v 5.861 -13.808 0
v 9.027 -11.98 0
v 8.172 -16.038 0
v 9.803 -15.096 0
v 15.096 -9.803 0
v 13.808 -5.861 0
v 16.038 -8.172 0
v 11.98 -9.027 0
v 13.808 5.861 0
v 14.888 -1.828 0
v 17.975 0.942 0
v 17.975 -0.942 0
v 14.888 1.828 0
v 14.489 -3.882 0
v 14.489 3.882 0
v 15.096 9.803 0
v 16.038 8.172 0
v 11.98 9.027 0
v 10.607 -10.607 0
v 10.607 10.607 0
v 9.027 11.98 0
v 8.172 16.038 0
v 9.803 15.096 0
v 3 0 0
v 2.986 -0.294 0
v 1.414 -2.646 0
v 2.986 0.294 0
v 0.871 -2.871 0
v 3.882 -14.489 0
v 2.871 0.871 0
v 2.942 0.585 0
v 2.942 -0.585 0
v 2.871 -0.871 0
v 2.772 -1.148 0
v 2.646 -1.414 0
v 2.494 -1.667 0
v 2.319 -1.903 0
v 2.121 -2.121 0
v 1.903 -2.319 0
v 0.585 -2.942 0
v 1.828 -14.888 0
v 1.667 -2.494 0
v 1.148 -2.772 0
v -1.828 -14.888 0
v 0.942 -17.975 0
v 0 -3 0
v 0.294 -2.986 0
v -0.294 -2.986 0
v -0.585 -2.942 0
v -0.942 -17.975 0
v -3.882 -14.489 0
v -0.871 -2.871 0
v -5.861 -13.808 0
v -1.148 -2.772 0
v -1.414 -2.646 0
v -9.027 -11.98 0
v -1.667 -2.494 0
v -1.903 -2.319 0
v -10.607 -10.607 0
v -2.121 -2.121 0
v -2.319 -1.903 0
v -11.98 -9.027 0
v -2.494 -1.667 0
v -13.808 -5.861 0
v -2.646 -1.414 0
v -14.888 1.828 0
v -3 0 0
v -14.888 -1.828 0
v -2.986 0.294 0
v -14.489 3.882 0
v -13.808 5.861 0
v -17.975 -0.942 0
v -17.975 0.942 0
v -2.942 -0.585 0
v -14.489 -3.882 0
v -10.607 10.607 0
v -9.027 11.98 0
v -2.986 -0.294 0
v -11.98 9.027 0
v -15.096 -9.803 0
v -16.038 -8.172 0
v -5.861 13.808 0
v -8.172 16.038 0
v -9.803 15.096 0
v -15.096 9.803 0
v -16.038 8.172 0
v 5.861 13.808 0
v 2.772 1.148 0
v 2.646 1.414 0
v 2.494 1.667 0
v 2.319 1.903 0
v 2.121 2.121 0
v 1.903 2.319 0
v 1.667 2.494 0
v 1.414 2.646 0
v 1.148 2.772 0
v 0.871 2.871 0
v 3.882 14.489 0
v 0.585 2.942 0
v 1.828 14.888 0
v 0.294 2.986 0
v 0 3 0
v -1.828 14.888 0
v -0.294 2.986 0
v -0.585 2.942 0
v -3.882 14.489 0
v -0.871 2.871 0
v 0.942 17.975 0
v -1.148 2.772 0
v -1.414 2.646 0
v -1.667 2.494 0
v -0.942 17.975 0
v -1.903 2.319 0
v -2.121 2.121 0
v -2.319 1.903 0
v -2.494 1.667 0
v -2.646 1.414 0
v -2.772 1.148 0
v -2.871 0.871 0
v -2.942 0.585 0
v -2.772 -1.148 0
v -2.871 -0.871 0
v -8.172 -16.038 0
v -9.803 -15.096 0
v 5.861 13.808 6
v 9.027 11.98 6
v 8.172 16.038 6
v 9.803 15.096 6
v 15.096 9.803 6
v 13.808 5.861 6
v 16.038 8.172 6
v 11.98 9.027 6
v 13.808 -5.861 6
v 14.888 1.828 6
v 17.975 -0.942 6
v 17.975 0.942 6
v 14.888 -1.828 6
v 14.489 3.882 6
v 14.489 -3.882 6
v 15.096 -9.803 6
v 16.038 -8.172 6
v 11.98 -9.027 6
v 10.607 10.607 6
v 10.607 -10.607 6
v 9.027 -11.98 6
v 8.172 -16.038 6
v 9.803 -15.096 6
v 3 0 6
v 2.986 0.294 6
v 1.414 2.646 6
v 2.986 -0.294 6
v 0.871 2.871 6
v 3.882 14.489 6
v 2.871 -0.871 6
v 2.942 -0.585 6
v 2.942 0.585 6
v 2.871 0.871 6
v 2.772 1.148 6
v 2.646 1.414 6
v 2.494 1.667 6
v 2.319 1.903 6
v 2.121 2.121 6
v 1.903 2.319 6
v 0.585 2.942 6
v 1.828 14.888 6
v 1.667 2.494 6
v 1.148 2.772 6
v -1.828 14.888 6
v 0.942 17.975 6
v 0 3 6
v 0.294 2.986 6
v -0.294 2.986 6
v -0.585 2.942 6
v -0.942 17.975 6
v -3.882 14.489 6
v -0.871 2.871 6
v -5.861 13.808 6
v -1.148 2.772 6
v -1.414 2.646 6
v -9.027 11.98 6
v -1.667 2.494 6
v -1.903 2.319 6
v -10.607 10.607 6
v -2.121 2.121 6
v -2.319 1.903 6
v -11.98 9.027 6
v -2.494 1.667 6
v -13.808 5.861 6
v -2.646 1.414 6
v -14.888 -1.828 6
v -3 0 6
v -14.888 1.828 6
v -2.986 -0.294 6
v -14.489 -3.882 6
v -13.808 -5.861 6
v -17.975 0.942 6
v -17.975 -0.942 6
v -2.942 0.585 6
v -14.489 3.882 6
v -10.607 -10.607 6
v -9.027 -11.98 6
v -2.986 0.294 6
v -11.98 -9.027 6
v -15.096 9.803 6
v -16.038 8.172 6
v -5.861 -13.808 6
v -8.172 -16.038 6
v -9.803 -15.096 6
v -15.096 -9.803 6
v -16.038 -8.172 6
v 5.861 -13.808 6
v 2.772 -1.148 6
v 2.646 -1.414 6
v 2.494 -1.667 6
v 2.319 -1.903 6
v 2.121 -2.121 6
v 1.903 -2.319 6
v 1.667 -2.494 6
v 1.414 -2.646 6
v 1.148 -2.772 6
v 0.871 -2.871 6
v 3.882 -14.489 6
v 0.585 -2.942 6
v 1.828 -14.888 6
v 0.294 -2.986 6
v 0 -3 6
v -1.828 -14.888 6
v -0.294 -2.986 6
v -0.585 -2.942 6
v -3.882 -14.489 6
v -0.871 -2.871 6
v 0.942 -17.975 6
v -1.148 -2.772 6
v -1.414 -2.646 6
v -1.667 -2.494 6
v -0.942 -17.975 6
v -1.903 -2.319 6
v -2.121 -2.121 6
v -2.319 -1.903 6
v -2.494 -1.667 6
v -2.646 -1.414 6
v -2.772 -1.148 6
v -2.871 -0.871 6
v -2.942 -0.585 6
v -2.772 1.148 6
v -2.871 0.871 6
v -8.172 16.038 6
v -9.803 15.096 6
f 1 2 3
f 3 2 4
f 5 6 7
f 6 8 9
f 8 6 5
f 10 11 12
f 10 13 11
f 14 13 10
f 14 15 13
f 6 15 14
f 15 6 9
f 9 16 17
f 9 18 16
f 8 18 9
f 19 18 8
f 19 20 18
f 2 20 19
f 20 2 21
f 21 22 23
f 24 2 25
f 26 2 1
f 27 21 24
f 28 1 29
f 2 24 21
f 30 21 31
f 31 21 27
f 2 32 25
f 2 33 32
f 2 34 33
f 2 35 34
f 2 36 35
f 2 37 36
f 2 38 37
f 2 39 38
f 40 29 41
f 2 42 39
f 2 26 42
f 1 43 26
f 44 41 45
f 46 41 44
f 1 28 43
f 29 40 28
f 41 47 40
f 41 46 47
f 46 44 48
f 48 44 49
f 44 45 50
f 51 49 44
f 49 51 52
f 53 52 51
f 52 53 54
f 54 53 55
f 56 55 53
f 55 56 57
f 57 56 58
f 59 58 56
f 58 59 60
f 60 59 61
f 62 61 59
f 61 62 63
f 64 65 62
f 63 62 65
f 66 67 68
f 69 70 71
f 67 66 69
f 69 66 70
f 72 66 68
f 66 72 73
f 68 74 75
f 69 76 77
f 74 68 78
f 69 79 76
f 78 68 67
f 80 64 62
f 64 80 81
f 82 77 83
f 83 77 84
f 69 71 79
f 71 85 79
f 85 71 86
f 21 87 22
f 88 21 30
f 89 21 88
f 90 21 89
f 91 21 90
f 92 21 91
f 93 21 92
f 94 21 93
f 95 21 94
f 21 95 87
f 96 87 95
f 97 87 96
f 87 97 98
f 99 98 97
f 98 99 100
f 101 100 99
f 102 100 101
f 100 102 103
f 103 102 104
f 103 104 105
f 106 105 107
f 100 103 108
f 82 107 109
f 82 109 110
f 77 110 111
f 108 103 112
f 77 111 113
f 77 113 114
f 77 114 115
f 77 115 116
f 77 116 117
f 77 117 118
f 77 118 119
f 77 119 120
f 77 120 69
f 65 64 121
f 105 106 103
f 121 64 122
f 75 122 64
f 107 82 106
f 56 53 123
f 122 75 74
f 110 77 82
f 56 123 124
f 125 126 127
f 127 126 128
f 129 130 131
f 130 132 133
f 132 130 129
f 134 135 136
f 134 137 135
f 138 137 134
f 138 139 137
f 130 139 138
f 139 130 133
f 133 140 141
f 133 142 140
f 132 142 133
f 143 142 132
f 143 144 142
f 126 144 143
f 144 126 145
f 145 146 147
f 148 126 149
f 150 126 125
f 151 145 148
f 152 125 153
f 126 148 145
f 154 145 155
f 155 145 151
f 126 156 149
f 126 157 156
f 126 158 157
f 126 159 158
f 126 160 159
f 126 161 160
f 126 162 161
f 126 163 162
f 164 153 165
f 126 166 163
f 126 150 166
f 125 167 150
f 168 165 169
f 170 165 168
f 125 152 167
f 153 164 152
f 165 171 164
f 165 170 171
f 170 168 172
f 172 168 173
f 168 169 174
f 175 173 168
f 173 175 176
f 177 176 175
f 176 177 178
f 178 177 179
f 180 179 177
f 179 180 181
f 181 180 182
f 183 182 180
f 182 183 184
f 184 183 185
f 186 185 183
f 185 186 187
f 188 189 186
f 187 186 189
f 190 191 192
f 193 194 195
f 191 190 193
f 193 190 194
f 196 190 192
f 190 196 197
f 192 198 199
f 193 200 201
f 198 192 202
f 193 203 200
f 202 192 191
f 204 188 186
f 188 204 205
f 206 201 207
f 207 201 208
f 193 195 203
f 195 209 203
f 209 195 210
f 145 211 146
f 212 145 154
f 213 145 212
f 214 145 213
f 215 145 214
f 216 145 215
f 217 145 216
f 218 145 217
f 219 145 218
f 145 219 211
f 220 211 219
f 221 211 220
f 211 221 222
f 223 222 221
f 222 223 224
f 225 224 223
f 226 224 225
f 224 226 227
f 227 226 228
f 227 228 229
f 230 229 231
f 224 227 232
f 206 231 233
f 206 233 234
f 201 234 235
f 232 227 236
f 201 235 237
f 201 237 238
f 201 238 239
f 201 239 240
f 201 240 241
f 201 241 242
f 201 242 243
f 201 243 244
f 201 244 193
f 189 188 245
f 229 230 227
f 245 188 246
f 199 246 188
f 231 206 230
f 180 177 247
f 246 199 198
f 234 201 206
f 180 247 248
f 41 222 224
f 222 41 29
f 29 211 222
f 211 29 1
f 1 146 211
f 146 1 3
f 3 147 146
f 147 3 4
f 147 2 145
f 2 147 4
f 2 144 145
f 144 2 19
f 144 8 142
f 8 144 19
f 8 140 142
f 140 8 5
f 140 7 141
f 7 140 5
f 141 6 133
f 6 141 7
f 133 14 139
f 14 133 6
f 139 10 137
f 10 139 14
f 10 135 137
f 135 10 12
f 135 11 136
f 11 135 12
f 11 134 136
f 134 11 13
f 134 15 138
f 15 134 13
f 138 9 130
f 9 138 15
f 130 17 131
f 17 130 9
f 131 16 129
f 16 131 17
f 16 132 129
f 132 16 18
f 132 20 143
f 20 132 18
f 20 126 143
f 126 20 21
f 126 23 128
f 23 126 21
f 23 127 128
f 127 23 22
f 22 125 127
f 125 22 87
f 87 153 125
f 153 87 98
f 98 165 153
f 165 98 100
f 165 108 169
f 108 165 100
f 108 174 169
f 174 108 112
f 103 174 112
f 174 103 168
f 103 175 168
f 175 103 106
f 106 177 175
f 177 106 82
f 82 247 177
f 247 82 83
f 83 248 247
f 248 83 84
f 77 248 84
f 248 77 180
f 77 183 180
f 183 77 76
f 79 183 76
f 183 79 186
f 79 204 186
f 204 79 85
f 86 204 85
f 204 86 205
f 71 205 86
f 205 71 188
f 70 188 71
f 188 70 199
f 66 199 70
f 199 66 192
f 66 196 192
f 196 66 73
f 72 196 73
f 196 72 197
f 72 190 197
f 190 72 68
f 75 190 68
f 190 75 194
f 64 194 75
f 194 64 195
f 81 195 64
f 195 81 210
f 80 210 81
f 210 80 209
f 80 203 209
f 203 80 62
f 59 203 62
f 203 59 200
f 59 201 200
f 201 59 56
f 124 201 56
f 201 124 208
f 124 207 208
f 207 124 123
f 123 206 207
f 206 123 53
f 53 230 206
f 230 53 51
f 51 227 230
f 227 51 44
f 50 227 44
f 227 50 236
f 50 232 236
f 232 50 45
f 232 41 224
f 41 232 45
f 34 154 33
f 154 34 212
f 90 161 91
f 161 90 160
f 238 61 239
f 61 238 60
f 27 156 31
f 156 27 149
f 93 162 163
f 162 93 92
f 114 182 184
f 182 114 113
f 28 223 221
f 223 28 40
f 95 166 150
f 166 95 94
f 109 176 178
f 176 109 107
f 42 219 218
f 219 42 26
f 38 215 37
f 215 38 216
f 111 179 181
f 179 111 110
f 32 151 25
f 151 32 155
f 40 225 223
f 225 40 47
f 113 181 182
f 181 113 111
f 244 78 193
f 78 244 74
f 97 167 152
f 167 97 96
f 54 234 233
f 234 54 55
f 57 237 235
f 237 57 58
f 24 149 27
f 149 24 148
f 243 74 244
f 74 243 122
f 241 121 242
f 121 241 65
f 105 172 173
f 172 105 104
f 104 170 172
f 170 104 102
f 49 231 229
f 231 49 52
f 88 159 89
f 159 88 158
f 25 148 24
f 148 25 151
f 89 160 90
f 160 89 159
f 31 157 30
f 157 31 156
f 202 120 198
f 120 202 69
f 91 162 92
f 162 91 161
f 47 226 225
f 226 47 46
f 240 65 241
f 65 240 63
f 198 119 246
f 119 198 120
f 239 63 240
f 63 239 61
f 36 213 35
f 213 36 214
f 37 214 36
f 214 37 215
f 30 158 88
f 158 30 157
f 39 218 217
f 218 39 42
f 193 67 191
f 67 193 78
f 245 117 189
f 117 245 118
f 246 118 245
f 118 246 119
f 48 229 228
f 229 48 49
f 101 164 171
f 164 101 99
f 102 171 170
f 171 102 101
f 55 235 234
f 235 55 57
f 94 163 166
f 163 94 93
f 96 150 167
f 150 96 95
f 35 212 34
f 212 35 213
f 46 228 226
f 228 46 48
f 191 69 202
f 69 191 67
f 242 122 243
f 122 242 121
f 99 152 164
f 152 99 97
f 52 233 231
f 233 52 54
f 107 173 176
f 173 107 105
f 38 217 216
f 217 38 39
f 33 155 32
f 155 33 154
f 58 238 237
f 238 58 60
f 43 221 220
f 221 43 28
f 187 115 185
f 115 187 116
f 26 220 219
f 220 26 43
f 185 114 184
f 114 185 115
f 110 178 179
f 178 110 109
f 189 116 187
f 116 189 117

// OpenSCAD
// Gear-like disc: a polygon profile extruded, with a central bore.
// The tooth pattern is phased so one tooth tip is centred on the +X axis.
teeth = 12;
root_r = 15;
tip_r = 18;
thickness = 6;
bore_d = 6;

function pt(r, a) = [r * cos(a), r * sin(a)];

module gear_profile() {
    step = 360 / teeth;
    polygon([
        for (i = [0 : teeth - 1])
            let (a = i * step - 15)
                each [
                    pt(root_r, a),
                    pt(root_r, a + 8),
                    pt(tip_r, a + 12),
                    pt(tip_r, a + 18),
                    pt(root_r, a + 22)
                ]
    ]);
}

module gear() {
    difference() {
        linear_extrude(height = thickness) gear_profile();
        translate([0, 0, -1])
            cylinder(h = thickness + 2, d = bore_d, $fn = 64);
    }
}

gear();
